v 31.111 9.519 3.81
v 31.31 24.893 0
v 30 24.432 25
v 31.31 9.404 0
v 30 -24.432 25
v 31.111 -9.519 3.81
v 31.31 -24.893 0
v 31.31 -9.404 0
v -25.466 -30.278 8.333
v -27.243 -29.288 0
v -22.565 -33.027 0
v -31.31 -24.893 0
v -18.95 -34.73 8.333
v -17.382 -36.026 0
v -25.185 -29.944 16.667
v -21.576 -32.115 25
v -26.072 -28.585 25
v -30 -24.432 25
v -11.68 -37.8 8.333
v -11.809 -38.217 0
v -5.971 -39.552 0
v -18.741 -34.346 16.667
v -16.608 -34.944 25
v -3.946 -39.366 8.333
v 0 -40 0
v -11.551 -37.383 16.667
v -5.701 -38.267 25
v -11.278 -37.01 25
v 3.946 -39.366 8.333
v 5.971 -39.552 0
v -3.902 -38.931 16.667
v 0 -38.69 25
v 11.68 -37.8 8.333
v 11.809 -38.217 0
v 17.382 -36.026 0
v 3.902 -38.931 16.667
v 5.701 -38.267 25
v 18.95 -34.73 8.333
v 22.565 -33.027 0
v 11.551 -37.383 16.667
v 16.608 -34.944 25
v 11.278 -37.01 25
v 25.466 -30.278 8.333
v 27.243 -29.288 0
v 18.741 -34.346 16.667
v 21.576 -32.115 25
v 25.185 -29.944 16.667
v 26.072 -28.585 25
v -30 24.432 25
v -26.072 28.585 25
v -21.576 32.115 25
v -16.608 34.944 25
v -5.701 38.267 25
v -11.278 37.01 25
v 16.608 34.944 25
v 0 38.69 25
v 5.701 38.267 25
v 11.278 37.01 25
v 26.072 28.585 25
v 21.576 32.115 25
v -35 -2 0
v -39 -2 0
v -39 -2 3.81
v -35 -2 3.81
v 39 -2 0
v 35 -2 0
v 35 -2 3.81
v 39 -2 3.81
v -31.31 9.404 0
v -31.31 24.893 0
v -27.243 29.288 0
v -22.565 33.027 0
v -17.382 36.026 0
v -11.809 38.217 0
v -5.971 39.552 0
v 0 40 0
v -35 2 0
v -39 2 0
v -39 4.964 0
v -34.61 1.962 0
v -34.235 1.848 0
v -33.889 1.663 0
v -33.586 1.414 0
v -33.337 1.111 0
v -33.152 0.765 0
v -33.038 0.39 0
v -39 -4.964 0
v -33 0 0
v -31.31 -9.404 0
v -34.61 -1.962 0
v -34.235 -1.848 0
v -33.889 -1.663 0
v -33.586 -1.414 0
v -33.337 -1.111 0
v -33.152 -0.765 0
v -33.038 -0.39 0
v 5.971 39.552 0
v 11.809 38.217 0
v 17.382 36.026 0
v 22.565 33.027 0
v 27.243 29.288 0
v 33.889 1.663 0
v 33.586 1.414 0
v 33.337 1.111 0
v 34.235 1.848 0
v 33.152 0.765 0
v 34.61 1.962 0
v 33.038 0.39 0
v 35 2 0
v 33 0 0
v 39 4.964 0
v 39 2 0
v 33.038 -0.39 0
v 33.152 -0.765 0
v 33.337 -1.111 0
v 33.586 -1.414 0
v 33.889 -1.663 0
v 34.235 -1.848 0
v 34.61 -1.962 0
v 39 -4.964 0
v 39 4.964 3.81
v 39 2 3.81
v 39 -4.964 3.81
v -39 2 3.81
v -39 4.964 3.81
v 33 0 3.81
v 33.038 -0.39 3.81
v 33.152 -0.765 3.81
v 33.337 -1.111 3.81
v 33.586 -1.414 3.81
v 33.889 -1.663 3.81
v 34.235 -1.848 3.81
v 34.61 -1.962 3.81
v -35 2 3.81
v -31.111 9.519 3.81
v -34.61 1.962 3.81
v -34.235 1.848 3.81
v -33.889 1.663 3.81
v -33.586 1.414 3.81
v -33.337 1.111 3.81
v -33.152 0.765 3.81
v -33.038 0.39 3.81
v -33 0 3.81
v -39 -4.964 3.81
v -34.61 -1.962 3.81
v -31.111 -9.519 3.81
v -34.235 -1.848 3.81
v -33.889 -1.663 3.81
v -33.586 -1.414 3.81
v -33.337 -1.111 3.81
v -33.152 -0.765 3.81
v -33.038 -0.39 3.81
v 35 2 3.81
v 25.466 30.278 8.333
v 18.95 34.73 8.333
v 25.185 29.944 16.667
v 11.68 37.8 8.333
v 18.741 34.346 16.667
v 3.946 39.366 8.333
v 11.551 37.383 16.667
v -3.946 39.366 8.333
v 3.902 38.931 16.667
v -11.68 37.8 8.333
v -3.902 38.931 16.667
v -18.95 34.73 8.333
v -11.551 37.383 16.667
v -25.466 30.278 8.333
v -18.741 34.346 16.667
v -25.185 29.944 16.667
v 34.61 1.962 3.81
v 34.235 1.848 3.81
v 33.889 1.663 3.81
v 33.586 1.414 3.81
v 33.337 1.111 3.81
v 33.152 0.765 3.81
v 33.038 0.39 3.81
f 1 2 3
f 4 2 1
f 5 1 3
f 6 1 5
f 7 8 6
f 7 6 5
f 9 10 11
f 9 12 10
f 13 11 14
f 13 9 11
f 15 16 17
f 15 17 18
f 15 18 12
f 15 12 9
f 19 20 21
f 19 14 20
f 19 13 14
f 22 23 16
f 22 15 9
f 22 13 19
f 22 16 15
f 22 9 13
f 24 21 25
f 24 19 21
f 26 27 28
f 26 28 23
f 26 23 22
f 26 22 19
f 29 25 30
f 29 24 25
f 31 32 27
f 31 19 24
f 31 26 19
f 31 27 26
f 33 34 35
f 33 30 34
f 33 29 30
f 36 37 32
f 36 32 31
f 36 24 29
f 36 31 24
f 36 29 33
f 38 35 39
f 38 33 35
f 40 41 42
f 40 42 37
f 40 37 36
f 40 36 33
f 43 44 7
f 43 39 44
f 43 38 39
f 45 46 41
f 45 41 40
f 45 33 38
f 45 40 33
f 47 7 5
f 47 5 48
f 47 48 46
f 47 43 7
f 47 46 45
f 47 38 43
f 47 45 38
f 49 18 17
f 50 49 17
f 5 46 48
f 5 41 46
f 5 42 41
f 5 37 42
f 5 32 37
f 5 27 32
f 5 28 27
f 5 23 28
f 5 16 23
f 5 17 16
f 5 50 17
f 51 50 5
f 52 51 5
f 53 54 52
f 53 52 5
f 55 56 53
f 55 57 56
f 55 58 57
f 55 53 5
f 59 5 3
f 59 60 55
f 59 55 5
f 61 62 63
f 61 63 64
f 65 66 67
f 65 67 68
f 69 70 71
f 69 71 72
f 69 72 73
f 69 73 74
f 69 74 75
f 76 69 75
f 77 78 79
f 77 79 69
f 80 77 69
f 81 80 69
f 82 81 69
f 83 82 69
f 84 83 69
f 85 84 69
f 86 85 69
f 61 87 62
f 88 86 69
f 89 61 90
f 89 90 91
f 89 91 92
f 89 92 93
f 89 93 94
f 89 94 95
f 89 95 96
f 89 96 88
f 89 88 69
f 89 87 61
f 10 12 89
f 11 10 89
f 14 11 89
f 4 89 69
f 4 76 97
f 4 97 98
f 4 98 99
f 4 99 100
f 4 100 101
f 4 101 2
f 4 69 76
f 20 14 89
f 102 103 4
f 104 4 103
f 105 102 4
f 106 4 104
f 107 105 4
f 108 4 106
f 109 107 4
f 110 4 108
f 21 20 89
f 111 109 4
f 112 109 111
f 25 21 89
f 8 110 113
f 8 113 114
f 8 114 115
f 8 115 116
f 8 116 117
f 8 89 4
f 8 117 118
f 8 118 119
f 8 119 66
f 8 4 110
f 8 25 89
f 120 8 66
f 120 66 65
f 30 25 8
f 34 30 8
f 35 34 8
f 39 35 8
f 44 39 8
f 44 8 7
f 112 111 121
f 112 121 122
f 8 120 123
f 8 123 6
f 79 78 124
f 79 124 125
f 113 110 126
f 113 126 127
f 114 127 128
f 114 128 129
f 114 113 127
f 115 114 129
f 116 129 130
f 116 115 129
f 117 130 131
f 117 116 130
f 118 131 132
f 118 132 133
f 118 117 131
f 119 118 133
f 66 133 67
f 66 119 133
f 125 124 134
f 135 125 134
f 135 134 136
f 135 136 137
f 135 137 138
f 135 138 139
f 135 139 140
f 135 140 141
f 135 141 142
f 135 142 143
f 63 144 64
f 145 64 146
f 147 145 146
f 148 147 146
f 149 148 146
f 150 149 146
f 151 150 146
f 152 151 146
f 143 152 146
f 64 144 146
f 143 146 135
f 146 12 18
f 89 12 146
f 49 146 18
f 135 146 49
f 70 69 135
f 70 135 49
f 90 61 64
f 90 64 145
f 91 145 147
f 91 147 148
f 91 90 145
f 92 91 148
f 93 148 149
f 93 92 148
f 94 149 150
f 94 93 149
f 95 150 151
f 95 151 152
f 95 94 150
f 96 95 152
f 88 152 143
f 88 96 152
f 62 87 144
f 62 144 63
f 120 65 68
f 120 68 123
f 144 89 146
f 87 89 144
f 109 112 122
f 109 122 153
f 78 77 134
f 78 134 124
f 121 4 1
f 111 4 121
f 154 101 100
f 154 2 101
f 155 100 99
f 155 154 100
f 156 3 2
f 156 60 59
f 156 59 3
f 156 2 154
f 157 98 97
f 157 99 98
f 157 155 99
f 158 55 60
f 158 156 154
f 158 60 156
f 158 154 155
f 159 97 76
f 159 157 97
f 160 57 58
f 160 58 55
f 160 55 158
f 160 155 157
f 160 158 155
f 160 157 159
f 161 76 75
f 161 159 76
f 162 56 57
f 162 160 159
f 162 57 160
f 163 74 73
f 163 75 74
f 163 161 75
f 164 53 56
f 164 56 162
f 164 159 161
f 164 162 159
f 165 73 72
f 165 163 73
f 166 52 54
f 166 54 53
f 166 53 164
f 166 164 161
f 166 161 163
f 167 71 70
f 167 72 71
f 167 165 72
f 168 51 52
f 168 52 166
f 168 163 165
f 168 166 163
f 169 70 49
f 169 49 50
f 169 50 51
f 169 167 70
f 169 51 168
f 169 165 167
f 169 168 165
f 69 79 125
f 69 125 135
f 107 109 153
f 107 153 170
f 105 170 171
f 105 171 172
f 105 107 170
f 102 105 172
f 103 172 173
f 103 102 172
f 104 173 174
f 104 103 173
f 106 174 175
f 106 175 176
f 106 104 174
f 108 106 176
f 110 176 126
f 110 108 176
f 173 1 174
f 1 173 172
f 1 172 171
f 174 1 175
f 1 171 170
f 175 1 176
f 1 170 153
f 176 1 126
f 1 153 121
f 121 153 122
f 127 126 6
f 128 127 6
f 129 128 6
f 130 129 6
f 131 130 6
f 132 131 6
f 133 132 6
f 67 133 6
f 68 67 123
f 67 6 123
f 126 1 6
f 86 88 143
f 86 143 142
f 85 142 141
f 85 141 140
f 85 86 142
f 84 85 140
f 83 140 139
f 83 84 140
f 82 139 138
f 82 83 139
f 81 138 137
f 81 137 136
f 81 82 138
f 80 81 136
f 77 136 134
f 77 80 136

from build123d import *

# Parameters (mm, degrees)
F0_R     = 40
F1_DEPTH = 25
F1_TAPER = 3
F2_W     = 25.4
F2_H     = 101.6
F3_DEPTH = 25.001
F3_TAPER = 3
F5_DEPTH = 3.81


with BuildPart() as f1:
    # F0 (on Top) → F1 (new body)
    with BuildSketch(Plane.XY):
        Circle(F0_R)
    extrude(amount=F1_DEPTH, taper=F1_TAPER)

    # F2 (on face) → F3 (cut, through all)
    with BuildSketch(Plane.XY.offset(25)):
        with Locations((-42.7, 0)):
            Rectangle(F2_W, F2_H)
        with Locations((42.7, 0)):
            Rectangle(F2_W, F2_H)
    extrude(amount=-F3_DEPTH, taper=F3_TAPER, mode=Mode.SUBTRACT)

    # F4 (on face) → F5 (join)
    with BuildSketch(Plane(origin=(0, 0, 0), x_dir=(1, 0, 0), z_dir=(0, 0, -1))):
        with BuildLine():
            ThreePointArc((-35, 2), (-33.5857864376, 1.4142135624), (-33, 0))
            ThreePointArc((-33, 0), (-33.5857864376, -1.4142135624), (-35, -2))
            Line((-35, -2), (-39, -2))
            Line((-39, -2), (-39, -4.9638475773))
            Line((-39, -4.9638475773), (-30, -10.16))
            Line((-30, -10.16), (-30, 10.16))
            Line((-30, 10.16), (-39, 4.9638475773))
            Line((-39, 4.9638475773), (-39, 2))
            Line((-39, 2), (-35, 2))
        make_face()
        with BuildLine():
            ThreePointArc((33, 0), (33.5857864376, 1.4142135624), (35, 2))
            Line((35, 2), (39, 2))
            Line((39, 2), (39, 4.9638475773))
            Line((39, 4.9638475773), (30, 10.16))
            Line((30, 10.16), (30, -10.16))
            Line((30, -10.16), (39, -4.9638475773))
            Line((39, -4.9638475773), (39, -2))
            Line((39, -2), (35, -2))
            ThreePointArc((35, -2), (33.5857864376, -1.4142135624), (33, 0))
        make_face()
    extrude(amount=-F5_DEPTH)


solid = f1.part
